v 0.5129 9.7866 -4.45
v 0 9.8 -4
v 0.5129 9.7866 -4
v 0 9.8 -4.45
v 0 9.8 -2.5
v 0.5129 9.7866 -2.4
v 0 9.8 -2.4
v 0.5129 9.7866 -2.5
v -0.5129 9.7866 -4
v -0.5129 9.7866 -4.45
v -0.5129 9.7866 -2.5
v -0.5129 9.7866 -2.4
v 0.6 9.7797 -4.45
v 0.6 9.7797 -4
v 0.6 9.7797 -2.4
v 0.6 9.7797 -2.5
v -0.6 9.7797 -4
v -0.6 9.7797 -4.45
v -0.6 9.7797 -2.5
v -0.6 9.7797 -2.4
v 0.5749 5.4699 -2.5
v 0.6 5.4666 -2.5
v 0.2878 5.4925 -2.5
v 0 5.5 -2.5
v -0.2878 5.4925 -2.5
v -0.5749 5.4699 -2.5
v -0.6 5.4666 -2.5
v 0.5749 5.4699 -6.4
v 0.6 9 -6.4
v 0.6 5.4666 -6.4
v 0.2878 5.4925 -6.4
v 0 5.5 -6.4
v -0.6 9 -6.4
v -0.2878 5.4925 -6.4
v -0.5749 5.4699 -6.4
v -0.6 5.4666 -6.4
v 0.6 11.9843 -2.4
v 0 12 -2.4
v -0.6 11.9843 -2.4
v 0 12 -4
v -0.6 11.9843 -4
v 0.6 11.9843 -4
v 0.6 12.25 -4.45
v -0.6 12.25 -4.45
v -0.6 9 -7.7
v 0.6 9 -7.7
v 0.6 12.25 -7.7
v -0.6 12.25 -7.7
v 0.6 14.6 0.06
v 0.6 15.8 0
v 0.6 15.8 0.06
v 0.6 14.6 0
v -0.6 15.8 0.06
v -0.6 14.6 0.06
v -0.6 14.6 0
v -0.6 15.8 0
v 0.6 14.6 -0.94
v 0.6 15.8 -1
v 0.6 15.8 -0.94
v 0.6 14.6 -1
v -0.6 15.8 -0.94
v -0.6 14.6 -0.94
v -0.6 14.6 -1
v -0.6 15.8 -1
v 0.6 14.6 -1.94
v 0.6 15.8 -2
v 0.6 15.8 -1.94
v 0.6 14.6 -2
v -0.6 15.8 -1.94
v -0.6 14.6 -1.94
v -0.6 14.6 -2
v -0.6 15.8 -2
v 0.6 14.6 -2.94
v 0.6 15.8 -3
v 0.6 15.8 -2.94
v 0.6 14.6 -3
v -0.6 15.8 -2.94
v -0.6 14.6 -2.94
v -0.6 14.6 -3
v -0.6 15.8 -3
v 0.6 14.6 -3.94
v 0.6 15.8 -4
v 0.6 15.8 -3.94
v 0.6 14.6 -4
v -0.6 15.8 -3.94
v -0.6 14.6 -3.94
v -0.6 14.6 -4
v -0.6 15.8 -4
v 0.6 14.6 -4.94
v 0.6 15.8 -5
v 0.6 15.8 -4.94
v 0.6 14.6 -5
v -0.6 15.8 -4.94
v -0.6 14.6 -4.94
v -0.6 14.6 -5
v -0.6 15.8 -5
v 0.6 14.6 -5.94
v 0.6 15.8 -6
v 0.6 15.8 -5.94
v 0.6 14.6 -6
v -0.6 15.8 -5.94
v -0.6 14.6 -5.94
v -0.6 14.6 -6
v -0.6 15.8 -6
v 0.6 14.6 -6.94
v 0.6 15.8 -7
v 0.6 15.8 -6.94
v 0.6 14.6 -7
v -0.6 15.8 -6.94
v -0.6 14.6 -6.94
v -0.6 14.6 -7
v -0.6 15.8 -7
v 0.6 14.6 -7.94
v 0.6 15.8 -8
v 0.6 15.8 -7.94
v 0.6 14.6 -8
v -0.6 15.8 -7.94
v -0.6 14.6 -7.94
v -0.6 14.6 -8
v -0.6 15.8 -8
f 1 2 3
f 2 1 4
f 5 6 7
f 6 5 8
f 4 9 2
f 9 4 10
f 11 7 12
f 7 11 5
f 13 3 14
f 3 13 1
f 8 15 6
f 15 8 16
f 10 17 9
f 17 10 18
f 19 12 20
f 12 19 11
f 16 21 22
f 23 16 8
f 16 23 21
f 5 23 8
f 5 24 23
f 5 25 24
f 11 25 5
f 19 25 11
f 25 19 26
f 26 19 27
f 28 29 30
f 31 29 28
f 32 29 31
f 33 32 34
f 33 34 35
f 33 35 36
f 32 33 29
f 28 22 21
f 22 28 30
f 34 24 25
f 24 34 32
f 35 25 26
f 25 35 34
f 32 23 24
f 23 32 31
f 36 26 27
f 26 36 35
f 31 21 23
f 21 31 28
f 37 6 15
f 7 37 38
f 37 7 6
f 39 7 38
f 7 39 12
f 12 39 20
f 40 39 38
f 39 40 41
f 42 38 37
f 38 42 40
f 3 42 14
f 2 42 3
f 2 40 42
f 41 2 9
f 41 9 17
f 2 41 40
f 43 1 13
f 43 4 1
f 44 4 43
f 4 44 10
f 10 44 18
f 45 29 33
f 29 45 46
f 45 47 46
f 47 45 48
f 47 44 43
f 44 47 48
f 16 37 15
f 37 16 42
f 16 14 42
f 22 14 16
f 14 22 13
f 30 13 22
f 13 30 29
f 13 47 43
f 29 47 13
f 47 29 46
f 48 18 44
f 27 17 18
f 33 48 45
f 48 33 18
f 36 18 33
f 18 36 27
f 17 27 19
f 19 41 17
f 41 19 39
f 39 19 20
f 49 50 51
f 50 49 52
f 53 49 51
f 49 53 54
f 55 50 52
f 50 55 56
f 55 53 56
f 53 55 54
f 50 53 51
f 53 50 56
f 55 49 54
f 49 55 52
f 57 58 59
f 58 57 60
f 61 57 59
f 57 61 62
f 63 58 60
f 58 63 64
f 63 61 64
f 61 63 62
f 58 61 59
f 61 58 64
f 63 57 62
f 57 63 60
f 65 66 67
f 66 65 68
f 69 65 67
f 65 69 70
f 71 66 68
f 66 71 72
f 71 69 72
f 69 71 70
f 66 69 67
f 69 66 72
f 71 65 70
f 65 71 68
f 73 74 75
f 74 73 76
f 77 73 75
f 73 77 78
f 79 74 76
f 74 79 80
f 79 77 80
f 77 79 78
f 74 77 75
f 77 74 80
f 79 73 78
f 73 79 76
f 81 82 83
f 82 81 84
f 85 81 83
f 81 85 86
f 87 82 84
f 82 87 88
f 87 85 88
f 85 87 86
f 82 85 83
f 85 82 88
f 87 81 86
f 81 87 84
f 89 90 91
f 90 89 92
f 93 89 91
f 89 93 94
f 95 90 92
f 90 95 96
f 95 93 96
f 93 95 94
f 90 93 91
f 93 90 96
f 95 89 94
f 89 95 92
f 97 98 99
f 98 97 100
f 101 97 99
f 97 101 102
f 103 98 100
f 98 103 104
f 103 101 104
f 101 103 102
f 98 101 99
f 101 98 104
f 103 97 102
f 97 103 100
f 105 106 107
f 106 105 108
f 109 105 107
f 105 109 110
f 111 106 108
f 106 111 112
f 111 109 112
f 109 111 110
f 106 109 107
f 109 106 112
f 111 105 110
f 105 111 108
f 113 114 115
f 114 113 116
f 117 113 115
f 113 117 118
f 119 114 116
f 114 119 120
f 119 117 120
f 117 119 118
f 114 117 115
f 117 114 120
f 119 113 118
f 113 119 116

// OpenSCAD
// 島（ねじ止めする内側の輪）を厚み 3.9mm にしたとき、その座がリードスイッチの溝へ
// 抜けるかどうかを見るためだけの図。数字は knob_v4.scad から読んだもの。
//   島の上面    z -2.5   （へこみの底）
//   島の底      z -6.4   （ザグリ 3.5 ＋ 底 0.4 ＝ 厚み 3.9）
//   リードの溝  z -7.7 〜 -4.45 ／ x ±7.15 ／ y 9.0〜12.25
//
// view = "cut" … +Y 方向の断面（横から見る。上下関係が見える）
//        "top" … 真上から（平面で重なる場所が見える）
//        "hit" … ぶつかっている体積だけ
view = "cut";
$fn = 120;

R_HOLE  = 5.5;    // 落とし込み穴の半径
R_ISL   = 9.8;    // 島の外の縁（＝溝の内側）
R_GRV   = 12.0;   // ツメの通り道の外側
R_DISH  = 13.1;   // へこみの壁
Z_TOP   = -2.5;   // 島の上面＝へこみの底
T_ISL   = 3.9;    // 島の厚み（ザグリ 3.5 ＋ 底 0.4）
Z_BOT   = Z_TOP - T_ISL;    // -6.4  島の底＝座の面
T_NOW   = 1.2;              // いまの輪の厚み（比較用）

REED_X  = 7.15;
REED_Y0 = 9.0;
REED_Y1 = 12.25;
REED_Z0 = -7.7;
REED_Z1 = -4.45;

SCR_R   = 7.6;    // ねじの半径位置
SCR_CB  = 5.0;    // ザグリの径
SCR_CBT = 3.5;    // ザグリの深さ
SCR_D   = 3.0;    // ねじの通し穴

module island() {
    difference() {
        translate([0, 0, Z_BOT]) cylinder(r = R_ISL, h = T_ISL);
        translate([0, 0, Z_BOT - 1]) cylinder(r = R_HOLE, h = T_ISL + 2);
    }
}
module island_now() {       // いまの厚み 1.2 の輪（比較）
    difference() {
        translate([0, 0, Z_TOP - T_NOW]) cylinder(r = R_ISL, h = T_NOW);
        translate([0, 0, Z_TOP - T_NOW - 1]) cylinder(r = R_HOLE, h = T_NOW + 2);
    }
}
module reed() {
    translate([-REED_X, REED_Y0, REED_Z0])
        cube([REED_X * 2, REED_Y1 - REED_Y0, REED_Z1 - REED_Z0]);
}
module screw() {            // ザグリ＋通し穴
    for (a = [0, 120, 210]) rotate([0, 0, a]) translate([SCR_R, 0, 0]) {
        translate([0, 0, Z_TOP - SCR_CBT]) cylinder(d = SCR_CB, h = SCR_CBT);
        translate([0, 0, Z_TOP - 8]) cylinder(d = SCR_D, h = 8);
    }
}
module rail() {             // ツメが通る溝
    difference() {
        translate([0, 0, Z_TOP - 1.5]) cylinder(r = R_GRV, h = 1.6);
        translate([0, 0, Z_TOP - 2.6]) cylinder(r = R_ISL, h = 4);
    }
}
module hit() { intersection() { island(); reed(); } }

module slab() { translate([-0.6, -2, -14]) cube([1.2, 20, 16]); }   // x ±0.6 の薄板

module scene() {
    color("#adb5bd") island();
    color("#1c7ed6") screw();
    color("#37b24d") rail();
    color("#f08c00") reed();
    color("#e03131") hit();
}

if (view == "hit") {
    color("#e03131") hit();
} else if (view == "cut") {
    intersection() { scene(); slab(); }
    // 目盛り（1mm ごと・+Y 側の外に立てる）
    for (k = [0 : 8]) color("#868e96")
        translate([-0.6, R_DISH + 1.5, -k]) cube([1.2, 1.2, 0.06]);
} else {
    scene();
}

echo(str("島 z ", Z_BOT, " 〜 ", Z_TOP, " / リードの溝 z ", REED_Z0, " 〜 ", REED_Z1));
echo(str("重なる z ", max(Z_BOT, REED_Z0), " 〜 ", min(Z_TOP, REED_Z1),
         " → 高さ ", min(Z_TOP, REED_Z1) - max(Z_BOT, REED_Z0), "mm"));
echo(str("重なる y ", REED_Y0, " 〜 ", R_ISL, " → 幅 ", R_ISL - REED_Y0, "mm"));
echo(str("いまの輪の底 z ", Z_TOP - T_NOW, " → リードの溝の天面 ", REED_Z1,
         " まで ", (Z_TOP - T_NOW) - REED_Z1, "mm"));
